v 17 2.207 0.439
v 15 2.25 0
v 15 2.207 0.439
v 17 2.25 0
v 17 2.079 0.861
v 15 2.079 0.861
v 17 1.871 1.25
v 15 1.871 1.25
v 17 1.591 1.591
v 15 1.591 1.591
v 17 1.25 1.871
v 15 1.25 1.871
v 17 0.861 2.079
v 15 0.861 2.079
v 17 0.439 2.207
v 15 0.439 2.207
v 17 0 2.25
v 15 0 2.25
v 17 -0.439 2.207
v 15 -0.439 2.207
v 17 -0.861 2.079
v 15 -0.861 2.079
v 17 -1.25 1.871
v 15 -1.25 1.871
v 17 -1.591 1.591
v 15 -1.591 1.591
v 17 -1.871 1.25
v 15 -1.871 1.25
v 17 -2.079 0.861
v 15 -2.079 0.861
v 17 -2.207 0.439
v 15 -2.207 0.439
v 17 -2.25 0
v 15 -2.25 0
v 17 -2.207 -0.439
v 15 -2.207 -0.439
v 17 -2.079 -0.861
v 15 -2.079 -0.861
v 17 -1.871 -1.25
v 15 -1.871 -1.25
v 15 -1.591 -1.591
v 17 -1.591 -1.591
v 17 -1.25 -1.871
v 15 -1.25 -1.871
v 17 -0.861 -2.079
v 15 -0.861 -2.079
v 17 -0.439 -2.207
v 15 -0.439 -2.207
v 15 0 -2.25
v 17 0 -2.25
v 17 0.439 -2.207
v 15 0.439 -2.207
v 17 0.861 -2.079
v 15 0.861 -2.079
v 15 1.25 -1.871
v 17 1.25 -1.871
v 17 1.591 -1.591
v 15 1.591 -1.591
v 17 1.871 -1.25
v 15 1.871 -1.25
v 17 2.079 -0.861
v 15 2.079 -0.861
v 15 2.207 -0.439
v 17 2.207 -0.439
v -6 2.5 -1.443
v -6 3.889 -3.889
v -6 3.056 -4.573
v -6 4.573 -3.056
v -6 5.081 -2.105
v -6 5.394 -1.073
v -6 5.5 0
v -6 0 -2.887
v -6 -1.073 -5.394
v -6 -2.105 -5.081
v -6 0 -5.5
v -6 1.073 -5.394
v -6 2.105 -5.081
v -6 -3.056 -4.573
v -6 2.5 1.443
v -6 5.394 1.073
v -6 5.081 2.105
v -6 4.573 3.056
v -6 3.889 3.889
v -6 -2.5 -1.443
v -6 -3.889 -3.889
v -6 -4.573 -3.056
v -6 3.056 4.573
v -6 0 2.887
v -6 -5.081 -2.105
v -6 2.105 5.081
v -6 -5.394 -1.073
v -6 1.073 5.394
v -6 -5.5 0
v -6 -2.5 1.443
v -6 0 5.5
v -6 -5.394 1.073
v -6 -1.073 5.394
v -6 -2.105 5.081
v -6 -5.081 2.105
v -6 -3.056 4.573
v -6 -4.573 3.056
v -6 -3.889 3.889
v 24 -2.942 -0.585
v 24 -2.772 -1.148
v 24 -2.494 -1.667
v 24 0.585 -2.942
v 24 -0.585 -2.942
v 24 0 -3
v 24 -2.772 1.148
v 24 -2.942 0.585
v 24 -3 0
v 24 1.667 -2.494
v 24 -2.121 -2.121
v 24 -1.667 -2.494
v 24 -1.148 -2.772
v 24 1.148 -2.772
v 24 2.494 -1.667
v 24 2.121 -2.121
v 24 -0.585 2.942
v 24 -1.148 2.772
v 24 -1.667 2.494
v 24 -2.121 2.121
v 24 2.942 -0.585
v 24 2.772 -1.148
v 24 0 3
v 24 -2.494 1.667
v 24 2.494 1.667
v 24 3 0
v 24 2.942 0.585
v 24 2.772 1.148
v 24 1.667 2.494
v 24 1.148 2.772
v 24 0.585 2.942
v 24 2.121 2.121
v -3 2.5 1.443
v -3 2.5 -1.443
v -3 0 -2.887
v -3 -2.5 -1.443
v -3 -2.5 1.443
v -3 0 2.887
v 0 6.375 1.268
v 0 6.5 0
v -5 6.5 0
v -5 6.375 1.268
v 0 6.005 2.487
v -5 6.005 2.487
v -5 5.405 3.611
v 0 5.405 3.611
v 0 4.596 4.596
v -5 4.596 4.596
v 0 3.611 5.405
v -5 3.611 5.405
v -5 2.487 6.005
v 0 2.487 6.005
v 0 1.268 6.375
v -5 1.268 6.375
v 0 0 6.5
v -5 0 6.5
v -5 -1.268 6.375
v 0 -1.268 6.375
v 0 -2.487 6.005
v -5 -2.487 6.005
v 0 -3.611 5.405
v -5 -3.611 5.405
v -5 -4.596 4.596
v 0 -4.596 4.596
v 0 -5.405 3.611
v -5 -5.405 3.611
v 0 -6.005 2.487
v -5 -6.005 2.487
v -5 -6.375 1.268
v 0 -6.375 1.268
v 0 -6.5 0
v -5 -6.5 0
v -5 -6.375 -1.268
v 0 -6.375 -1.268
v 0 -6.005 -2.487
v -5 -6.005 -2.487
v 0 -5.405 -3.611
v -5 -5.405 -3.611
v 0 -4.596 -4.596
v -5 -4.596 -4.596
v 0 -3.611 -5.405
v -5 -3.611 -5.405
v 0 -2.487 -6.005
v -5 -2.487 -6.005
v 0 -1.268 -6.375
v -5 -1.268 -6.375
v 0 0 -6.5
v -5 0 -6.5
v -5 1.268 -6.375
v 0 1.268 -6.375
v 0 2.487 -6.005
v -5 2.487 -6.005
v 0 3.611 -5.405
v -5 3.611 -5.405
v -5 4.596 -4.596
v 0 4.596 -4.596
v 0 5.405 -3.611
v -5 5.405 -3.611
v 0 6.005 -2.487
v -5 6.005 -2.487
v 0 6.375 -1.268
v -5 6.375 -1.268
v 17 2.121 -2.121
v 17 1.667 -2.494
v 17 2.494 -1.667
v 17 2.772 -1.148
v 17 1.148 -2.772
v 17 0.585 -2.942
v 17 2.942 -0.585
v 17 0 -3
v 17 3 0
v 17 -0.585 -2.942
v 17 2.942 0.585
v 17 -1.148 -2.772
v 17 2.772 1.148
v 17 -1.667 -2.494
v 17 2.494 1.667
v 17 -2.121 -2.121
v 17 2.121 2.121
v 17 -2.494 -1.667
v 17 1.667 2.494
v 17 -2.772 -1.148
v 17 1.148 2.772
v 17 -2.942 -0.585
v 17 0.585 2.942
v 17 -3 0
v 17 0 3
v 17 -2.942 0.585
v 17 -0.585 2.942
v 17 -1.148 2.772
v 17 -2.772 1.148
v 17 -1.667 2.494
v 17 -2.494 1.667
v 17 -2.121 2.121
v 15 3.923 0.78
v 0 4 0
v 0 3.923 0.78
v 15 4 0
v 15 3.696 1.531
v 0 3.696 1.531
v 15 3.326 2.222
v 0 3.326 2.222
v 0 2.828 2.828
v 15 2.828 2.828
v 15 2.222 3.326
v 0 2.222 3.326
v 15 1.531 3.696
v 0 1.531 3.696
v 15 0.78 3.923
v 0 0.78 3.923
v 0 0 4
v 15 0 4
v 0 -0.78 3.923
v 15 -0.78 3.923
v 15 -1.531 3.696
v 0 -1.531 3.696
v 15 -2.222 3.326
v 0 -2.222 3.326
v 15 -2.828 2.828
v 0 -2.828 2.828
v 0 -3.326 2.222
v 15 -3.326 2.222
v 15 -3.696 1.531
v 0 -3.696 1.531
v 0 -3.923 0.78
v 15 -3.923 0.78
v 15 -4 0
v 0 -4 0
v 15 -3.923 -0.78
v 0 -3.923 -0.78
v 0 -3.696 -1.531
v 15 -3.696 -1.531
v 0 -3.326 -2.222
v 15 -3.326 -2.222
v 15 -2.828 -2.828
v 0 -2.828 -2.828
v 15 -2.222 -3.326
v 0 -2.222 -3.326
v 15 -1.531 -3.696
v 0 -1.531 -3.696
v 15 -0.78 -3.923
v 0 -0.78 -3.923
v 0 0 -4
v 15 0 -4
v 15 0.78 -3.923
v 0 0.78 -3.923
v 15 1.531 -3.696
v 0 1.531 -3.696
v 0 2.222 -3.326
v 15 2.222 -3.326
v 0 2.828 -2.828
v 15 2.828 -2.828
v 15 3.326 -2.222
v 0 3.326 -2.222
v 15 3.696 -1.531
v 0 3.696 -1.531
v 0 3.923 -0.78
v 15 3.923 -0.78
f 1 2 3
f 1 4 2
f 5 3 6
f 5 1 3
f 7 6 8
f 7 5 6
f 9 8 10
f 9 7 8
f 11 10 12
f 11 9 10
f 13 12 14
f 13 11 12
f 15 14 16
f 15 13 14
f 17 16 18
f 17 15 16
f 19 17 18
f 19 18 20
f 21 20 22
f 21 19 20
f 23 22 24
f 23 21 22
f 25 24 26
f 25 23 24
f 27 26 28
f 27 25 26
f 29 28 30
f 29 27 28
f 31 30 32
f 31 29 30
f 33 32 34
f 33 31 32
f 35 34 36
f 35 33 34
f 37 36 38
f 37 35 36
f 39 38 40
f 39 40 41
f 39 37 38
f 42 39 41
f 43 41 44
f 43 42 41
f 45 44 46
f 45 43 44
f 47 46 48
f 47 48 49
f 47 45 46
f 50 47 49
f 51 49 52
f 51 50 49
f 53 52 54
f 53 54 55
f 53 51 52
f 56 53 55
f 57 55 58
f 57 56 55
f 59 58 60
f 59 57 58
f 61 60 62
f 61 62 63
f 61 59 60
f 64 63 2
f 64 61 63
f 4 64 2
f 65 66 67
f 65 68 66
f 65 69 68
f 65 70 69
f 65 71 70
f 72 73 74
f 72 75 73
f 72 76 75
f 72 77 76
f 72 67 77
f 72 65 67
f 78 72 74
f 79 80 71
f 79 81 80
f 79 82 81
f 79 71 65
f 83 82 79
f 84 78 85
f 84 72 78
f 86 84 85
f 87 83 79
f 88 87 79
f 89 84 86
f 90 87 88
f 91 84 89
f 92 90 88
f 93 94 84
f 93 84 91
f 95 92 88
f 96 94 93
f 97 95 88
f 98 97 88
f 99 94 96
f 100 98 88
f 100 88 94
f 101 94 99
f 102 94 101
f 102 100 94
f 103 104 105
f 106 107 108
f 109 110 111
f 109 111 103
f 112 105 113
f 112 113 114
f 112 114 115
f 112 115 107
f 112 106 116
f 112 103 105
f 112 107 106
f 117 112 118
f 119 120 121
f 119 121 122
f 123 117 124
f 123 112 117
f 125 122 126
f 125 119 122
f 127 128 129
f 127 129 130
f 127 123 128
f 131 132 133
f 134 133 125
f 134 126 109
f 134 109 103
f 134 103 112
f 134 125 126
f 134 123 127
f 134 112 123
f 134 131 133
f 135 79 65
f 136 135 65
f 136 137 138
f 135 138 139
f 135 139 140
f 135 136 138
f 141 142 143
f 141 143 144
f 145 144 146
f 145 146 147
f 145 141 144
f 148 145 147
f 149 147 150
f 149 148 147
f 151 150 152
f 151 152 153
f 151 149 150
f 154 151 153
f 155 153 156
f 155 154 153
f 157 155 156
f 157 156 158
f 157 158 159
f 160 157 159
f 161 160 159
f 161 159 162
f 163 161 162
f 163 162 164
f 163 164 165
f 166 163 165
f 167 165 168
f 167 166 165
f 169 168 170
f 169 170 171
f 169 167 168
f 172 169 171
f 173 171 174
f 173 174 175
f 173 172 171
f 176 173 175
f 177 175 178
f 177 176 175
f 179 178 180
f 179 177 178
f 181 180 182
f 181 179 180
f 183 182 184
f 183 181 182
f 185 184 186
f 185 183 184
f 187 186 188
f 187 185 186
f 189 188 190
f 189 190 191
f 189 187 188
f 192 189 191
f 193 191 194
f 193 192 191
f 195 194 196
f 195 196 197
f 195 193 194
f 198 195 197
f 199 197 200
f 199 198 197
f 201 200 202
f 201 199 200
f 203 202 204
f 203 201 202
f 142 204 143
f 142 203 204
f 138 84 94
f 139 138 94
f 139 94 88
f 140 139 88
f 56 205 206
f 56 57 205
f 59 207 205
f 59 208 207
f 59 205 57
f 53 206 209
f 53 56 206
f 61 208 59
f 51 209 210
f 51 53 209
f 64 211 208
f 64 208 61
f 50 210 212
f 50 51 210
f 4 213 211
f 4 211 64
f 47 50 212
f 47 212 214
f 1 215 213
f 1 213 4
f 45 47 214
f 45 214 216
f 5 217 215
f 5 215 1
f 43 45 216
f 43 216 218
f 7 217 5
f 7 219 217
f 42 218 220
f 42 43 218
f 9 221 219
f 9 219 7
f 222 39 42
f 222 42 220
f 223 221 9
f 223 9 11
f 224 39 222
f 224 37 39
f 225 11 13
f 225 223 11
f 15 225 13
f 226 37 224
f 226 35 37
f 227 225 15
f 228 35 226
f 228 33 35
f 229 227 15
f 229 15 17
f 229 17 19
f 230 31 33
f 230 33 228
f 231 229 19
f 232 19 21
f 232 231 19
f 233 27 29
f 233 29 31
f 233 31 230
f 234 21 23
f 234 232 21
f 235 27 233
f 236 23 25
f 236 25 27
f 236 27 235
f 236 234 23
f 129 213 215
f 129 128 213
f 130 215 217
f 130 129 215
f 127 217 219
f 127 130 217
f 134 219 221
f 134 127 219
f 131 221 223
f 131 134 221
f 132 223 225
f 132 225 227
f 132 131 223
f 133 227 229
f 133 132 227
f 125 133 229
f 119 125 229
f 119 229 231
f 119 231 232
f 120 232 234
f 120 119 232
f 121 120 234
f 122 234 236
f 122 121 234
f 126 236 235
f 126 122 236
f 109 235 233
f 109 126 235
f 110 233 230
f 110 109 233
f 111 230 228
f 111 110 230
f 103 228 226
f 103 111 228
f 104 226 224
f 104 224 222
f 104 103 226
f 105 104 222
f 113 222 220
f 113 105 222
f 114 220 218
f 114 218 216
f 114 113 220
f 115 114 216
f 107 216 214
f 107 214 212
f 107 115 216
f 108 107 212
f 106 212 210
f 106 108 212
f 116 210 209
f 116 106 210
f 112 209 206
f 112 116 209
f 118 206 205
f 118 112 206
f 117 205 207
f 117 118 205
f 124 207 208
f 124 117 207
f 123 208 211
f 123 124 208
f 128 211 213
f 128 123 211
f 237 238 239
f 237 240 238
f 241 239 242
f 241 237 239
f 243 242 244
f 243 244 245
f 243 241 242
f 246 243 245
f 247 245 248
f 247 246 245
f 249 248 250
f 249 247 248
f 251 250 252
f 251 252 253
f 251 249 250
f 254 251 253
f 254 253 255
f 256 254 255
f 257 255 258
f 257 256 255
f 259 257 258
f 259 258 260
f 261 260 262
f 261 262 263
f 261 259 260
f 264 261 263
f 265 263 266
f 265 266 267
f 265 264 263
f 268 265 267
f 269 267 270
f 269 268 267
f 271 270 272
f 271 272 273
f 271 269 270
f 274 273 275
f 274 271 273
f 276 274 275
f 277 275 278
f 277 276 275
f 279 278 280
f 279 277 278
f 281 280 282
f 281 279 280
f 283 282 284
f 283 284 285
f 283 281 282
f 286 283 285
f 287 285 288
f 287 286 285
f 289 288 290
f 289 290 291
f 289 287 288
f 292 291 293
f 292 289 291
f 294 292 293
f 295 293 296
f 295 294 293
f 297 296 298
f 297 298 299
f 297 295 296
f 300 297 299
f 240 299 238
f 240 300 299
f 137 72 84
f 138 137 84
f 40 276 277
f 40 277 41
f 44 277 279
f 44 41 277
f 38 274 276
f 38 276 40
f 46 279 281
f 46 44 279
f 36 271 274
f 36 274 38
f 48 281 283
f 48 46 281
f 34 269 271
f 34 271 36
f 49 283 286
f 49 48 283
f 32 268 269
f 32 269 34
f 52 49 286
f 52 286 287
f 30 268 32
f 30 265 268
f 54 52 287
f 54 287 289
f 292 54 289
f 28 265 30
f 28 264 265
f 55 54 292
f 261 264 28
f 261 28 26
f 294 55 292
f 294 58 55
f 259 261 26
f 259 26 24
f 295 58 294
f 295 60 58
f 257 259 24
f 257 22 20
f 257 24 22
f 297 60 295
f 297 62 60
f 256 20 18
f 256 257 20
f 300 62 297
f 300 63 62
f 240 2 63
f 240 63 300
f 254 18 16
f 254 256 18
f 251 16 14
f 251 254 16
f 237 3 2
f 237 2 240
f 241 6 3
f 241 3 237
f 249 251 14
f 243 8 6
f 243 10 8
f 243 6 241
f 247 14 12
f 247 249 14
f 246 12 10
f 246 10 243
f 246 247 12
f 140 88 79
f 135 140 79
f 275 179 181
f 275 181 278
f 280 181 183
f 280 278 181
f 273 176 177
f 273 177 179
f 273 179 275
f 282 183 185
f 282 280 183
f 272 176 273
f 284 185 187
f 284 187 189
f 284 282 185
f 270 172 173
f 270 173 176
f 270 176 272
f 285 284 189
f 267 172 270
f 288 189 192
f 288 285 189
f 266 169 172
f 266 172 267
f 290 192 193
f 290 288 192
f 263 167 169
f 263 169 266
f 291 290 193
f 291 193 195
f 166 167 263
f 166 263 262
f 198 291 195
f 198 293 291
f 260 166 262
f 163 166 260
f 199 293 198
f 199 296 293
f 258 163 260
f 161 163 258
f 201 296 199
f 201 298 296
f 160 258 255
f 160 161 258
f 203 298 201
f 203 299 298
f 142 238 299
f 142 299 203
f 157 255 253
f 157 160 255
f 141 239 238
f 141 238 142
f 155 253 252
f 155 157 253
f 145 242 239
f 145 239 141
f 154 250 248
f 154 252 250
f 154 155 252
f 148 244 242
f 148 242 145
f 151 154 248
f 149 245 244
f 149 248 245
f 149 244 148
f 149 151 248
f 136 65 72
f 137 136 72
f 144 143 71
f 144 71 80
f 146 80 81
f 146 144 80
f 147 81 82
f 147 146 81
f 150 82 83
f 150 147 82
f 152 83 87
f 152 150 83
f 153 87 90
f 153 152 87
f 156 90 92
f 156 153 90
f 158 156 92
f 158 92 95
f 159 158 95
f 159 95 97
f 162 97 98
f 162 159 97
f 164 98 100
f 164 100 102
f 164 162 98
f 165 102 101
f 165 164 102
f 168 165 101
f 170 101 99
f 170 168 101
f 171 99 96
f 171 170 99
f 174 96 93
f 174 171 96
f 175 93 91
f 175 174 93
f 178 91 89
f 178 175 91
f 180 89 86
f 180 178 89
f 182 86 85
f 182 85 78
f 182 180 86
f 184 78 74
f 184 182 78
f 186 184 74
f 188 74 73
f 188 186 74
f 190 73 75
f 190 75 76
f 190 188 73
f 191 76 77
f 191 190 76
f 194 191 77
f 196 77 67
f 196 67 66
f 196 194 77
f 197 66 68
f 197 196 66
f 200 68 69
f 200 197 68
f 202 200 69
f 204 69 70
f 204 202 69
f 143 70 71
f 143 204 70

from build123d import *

# Parameters (mm, degrees)
CUT_EXTRUDE1_DEPTH = 3
CHAMFER1_SIZE      = 1


with BuildPart() as part:
    # Sketch1 → Revolve1 (revolve)
    with BuildSketch(Plane.XY):
        Polygon((-6, 0), (-6, 6.5), (0, 6.5), (0, 4), (15, 4), (15, 2.25), (17, 2.25), (17, 3), (24, 3), (24, 0), align=None)
    revolve(axis=Axis((-26.012554328, 0, 0), (1, 0, 0)))

    # Sketch2 → Cut-Extrude1 (cut)
    with BuildSketch(Plane.ZY.offset(6)):
        Polygon((2.886751346, 0), (1.443375673, 2.5), (-1.443375673, 2.5), (-2.886751346, 0), (-1.443375673, -2.5), (1.443375673, -2.5), align=None)
    extrude(amount=-CUT_EXTRUDE1_DEPTH, mode=Mode.SUBTRACT)

    # Chamfer1
    chamfer1_edges = [part.edges().sort_by_distance(p)[0] for p in [
        (-6, -6.5, 0),
    ]]
    chamfer(chamfer1_edges, length=CHAMFER1_SIZE)


solid = part.part
